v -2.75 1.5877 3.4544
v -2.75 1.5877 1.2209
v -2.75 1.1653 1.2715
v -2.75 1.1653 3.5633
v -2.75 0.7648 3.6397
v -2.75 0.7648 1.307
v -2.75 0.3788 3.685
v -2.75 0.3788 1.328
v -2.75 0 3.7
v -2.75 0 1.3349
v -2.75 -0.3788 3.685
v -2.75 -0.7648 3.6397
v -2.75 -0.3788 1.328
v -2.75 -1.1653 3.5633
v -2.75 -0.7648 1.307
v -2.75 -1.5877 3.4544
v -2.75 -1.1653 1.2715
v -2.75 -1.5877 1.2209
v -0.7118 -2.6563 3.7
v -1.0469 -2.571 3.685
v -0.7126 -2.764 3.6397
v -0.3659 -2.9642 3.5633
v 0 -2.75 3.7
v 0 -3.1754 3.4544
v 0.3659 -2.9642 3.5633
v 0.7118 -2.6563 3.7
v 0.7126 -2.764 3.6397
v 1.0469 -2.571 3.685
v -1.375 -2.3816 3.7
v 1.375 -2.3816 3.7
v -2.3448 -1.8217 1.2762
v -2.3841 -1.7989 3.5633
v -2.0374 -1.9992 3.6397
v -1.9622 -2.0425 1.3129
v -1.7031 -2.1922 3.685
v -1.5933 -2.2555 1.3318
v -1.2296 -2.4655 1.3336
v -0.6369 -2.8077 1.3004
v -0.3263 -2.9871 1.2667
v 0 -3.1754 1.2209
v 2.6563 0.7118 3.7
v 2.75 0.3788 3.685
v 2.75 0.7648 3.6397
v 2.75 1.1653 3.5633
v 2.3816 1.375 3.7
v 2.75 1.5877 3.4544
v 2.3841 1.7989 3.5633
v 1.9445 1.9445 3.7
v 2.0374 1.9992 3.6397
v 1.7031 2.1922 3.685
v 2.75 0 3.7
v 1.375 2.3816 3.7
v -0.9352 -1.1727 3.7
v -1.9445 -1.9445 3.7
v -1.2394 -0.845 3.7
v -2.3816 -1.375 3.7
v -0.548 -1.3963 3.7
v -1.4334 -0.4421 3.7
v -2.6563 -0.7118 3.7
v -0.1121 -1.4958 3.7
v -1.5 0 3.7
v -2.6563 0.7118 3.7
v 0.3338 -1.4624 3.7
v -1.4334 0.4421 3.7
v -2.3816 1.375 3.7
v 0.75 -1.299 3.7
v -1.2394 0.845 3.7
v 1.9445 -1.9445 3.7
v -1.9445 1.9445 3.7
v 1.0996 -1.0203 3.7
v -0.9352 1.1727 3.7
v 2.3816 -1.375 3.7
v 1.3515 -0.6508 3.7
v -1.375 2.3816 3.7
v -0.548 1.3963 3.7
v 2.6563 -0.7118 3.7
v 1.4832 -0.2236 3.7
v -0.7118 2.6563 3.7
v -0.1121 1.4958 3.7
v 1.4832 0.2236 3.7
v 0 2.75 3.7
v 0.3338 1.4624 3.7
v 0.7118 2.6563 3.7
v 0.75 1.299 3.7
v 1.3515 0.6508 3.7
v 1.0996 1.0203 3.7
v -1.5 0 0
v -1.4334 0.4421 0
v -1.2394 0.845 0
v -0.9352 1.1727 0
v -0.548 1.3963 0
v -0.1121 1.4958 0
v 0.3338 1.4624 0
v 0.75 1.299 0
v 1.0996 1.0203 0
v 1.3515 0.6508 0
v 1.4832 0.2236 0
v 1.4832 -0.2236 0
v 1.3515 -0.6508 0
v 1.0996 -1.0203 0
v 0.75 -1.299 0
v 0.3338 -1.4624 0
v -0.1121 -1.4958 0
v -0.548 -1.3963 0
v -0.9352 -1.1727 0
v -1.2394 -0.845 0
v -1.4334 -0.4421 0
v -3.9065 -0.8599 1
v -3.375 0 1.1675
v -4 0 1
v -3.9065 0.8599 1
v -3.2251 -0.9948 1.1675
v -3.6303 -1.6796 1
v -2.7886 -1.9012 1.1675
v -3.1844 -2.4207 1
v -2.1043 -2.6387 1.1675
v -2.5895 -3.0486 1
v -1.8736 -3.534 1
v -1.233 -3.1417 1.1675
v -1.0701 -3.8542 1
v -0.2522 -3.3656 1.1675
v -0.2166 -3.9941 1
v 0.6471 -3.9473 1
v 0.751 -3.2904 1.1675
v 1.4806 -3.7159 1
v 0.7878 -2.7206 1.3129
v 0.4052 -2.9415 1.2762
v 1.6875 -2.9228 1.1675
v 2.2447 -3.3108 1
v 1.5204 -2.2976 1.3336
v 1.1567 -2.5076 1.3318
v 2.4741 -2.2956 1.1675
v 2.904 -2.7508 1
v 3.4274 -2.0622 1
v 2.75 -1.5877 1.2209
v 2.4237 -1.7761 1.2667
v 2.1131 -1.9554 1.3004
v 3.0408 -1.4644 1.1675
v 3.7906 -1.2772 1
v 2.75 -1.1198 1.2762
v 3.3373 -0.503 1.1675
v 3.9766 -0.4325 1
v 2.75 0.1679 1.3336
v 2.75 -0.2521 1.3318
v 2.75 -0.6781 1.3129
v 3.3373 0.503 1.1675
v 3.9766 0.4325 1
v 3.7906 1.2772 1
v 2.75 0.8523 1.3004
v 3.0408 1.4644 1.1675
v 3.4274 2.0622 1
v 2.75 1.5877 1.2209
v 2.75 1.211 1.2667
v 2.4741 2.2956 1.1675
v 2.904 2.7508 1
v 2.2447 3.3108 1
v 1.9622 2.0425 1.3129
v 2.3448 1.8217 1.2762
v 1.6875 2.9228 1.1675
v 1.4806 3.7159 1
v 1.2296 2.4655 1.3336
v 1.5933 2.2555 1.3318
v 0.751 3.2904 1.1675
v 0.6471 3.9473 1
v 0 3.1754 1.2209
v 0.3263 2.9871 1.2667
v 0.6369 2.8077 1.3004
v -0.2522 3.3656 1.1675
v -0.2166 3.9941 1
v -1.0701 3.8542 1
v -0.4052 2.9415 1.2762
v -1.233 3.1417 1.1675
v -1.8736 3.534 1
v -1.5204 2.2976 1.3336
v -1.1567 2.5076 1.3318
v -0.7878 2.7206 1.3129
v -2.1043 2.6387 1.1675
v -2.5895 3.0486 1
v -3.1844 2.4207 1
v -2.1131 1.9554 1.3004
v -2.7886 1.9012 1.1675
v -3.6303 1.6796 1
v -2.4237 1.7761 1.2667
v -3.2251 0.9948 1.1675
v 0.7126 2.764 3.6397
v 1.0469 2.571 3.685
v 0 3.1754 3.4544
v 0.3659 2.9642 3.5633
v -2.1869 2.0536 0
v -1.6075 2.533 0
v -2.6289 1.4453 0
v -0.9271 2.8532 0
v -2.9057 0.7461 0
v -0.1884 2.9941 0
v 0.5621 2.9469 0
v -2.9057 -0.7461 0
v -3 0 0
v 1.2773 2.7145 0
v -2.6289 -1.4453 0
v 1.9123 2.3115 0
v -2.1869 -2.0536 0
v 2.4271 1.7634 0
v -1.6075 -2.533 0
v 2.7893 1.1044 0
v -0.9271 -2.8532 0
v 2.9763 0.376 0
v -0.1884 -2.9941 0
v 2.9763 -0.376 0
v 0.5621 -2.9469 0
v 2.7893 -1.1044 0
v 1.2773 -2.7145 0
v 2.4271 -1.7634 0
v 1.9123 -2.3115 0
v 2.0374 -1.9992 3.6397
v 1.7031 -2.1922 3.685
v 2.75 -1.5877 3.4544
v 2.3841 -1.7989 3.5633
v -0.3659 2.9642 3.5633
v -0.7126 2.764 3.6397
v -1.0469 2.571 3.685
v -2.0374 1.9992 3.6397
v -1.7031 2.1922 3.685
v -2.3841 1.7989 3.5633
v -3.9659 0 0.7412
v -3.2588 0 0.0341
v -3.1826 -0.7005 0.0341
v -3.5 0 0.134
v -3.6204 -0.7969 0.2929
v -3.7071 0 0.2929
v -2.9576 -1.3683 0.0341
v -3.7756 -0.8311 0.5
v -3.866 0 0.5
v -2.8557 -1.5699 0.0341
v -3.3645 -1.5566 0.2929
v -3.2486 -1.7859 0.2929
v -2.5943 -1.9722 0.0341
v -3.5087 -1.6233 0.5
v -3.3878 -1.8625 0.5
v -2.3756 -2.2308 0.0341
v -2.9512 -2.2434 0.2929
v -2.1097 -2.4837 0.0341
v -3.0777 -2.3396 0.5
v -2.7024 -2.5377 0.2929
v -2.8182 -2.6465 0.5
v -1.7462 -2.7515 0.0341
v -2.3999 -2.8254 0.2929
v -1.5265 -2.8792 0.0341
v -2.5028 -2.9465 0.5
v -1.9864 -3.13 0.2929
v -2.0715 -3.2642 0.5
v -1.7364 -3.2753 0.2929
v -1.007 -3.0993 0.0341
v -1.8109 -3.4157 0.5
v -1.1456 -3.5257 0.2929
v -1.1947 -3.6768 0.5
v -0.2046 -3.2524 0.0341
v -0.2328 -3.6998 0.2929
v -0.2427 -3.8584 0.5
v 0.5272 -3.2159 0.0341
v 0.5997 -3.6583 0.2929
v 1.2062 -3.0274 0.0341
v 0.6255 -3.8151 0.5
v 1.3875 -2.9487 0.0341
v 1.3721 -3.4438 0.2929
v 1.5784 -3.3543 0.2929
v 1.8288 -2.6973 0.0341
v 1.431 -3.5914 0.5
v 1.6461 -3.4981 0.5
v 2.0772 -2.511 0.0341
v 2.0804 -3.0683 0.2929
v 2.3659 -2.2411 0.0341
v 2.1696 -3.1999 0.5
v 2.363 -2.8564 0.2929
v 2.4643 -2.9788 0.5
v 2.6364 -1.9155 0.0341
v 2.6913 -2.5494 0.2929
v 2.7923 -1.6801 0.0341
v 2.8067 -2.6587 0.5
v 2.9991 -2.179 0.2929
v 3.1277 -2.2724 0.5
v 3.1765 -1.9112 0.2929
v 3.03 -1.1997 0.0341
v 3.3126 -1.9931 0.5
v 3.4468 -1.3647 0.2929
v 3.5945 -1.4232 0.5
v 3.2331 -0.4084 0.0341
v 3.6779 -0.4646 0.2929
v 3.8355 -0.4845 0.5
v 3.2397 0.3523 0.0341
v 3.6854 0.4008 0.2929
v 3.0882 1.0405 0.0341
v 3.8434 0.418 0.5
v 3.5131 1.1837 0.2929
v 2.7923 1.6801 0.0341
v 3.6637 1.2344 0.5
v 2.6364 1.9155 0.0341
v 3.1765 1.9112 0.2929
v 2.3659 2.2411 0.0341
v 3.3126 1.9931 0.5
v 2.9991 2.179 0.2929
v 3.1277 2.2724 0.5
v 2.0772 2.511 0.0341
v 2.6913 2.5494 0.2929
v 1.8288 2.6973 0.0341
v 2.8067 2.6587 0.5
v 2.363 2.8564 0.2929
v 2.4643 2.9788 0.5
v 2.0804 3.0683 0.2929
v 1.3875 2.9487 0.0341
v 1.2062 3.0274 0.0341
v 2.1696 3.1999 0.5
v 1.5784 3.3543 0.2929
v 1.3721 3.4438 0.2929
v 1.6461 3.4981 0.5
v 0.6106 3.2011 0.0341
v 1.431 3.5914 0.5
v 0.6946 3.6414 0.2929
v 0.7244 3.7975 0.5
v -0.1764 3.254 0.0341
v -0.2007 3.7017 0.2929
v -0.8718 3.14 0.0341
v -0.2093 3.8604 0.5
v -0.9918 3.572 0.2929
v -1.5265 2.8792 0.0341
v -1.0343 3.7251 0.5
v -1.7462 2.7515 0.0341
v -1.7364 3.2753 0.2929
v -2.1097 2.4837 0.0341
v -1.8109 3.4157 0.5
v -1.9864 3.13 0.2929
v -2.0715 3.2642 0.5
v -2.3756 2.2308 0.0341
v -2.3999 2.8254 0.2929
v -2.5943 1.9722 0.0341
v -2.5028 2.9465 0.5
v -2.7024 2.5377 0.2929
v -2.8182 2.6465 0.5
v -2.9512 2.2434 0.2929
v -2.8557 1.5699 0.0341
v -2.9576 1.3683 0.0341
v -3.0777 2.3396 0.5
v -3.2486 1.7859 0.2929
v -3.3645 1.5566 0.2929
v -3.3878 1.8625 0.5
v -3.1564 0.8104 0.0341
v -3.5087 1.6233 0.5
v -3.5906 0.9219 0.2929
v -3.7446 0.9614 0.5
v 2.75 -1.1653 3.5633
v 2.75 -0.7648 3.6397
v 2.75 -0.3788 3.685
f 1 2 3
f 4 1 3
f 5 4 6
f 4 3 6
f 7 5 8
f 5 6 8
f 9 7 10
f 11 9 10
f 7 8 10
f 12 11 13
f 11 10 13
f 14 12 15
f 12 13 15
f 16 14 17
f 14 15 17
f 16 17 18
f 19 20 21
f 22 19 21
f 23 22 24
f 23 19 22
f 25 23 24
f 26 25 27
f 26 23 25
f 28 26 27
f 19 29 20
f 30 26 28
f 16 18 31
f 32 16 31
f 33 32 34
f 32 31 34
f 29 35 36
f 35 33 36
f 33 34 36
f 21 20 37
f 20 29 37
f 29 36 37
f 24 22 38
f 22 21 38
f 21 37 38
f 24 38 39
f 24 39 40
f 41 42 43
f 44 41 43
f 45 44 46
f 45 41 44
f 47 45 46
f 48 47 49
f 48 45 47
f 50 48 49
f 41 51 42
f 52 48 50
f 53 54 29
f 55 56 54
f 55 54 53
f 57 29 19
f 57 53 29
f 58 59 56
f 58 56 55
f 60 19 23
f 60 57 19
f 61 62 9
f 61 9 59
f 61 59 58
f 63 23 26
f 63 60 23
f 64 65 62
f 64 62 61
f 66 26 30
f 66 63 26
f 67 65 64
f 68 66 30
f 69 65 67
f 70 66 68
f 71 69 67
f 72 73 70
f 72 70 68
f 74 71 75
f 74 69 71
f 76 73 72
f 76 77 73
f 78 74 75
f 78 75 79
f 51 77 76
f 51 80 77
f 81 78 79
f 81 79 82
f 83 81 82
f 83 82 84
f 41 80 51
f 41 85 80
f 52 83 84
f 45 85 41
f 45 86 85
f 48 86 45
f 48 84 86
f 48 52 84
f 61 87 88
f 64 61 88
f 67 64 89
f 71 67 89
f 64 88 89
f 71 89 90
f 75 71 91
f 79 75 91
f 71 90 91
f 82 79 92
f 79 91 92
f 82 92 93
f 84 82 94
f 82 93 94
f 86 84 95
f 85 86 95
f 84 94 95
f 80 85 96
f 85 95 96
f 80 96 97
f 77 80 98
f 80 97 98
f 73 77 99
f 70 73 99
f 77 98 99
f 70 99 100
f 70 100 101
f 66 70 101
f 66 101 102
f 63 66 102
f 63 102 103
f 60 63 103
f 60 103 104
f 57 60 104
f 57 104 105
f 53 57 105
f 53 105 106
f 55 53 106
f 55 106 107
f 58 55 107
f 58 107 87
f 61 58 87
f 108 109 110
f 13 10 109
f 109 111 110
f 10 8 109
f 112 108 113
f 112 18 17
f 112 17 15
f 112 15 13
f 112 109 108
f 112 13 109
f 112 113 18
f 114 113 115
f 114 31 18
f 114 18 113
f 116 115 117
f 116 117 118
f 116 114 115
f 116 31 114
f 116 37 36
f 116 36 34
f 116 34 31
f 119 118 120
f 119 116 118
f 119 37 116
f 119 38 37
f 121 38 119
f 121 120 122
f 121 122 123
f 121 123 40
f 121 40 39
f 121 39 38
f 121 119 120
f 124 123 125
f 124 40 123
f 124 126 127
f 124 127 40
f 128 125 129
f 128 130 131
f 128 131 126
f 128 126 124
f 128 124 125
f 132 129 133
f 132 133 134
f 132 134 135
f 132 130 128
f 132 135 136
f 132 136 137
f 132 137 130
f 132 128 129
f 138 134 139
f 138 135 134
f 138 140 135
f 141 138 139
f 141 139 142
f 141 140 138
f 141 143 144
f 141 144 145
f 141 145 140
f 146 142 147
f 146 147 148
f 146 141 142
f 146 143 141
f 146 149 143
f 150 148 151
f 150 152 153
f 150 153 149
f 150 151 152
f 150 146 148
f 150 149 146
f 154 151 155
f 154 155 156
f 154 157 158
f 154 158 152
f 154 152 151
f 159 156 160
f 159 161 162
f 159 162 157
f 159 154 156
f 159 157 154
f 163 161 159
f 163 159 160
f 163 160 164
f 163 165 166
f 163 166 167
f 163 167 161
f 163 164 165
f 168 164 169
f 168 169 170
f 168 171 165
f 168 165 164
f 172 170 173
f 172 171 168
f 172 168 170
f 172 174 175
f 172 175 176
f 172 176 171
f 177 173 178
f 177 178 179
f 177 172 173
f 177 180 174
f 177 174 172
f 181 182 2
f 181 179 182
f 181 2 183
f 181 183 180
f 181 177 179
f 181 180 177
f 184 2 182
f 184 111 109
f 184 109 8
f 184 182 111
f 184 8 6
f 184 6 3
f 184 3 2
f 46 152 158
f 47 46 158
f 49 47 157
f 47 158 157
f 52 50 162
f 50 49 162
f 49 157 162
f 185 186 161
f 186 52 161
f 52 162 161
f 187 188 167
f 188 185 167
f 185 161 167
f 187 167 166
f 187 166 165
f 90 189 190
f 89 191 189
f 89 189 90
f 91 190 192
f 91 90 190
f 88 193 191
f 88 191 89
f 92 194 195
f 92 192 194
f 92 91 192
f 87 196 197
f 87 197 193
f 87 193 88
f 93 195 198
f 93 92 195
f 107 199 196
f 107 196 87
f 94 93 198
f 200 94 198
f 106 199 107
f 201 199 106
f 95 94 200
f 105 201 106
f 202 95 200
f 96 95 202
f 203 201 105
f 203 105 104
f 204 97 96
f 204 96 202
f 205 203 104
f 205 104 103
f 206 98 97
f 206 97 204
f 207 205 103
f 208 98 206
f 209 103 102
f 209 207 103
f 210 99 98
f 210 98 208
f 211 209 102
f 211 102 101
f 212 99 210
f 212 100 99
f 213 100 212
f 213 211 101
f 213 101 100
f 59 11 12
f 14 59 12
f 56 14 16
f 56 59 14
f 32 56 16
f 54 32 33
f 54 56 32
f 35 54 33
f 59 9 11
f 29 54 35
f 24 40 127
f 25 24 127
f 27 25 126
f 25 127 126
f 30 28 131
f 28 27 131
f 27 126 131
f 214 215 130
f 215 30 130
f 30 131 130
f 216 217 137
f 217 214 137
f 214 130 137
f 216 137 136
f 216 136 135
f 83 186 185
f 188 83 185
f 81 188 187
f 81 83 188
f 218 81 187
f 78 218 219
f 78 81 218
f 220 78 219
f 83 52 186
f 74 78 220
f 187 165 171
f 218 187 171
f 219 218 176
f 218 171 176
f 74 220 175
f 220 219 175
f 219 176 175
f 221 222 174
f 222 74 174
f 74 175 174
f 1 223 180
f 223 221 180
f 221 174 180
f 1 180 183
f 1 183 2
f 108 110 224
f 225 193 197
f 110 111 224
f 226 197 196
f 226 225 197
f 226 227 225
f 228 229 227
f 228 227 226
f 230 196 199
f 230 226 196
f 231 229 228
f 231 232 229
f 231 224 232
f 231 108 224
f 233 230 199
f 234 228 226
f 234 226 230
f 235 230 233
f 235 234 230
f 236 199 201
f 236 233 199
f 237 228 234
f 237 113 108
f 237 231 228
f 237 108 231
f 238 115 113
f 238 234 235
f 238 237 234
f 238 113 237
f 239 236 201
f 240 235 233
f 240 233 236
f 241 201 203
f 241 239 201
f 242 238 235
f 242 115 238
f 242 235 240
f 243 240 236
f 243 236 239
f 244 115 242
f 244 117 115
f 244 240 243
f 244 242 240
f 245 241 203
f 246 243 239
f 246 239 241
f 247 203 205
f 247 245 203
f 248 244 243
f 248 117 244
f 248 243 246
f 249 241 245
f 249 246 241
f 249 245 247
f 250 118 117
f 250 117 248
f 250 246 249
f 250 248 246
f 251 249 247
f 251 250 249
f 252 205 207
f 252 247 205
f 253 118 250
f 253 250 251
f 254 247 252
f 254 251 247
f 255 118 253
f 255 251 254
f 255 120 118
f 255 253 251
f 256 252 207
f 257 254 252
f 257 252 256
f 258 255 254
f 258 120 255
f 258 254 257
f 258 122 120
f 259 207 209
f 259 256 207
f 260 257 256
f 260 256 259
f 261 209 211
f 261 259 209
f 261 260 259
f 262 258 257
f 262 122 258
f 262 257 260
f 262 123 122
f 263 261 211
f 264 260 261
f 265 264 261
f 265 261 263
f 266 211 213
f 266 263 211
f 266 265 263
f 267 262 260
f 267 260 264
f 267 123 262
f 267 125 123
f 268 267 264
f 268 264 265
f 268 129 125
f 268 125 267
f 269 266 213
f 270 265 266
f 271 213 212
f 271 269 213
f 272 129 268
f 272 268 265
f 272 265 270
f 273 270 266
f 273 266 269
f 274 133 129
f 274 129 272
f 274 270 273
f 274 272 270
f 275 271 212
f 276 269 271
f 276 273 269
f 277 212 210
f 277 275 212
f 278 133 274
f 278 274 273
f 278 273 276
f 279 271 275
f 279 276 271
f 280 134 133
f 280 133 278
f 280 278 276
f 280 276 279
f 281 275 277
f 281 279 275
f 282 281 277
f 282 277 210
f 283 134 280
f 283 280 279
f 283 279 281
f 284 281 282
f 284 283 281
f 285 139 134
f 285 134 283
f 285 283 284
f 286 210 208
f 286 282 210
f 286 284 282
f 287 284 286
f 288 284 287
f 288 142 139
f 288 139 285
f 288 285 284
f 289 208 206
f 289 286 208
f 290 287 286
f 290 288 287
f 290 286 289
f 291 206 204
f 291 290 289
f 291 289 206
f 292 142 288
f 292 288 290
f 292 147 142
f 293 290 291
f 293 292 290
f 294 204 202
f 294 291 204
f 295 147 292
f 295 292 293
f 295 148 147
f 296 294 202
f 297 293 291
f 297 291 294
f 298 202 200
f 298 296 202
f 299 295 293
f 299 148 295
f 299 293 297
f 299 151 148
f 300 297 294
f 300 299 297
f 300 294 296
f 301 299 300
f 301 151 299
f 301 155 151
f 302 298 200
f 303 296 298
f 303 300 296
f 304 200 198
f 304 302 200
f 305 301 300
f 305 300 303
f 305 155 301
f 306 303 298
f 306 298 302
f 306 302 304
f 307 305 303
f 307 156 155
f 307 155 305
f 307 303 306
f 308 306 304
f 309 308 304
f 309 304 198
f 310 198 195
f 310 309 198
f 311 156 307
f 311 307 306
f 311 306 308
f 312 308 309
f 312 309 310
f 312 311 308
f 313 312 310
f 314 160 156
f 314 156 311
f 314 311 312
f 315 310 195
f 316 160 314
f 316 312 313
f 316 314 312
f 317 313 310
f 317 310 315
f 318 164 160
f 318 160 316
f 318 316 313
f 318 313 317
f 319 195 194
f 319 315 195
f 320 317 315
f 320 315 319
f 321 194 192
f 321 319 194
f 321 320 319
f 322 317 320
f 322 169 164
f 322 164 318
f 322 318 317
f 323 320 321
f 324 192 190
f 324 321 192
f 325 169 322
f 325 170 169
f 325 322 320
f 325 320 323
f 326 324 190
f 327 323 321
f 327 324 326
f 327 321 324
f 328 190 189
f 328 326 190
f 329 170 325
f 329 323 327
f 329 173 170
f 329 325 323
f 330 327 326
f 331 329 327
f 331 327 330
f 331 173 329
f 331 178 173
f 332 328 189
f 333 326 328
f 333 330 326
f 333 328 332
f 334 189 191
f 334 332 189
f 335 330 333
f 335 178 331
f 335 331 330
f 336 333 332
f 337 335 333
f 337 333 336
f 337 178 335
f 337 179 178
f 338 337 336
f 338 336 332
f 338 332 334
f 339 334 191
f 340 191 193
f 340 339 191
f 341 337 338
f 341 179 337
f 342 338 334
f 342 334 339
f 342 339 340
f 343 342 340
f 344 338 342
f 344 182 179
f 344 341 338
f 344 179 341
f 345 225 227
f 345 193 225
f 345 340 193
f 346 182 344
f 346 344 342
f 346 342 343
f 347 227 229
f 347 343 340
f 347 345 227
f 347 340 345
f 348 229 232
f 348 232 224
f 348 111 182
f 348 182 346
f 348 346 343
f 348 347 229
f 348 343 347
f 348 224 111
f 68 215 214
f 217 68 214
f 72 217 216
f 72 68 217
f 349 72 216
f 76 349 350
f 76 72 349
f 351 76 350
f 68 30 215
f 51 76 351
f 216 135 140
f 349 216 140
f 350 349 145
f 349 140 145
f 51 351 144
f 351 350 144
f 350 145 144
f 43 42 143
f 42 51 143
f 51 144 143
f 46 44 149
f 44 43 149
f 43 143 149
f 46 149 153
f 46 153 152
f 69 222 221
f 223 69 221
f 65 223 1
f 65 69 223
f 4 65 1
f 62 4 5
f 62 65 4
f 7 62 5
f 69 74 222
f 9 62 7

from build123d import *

# Parameters (mm, degrees)
EXTRUDE1_DEPTH     = 2.7
SKETCH4_R          = 1.5
CUT_EXTRUDE1_DEPTH = 7.759437846


with BuildPart() as part:
    # Sketch1 → Extrude1 (new body)
    with BuildSketch(Plane.XY.offset(1)):
        Polygon((0, 3.175426481), (-2.75, 1.58771324), (-2.75, -1.58771324), (0, -3.175426481), (2.75, -1.58771324), (2.75, 1.58771324), align=None)
    extrude(amount=EXTRUDE1_DEPTH)

    # Sketch2 → Revolve1 (revolve)
    with BuildSketch(Plane(origin=(0, 0, 0), x_dir=(0, 0, -1), z_dir=(1, 0, 0)), mode=Mode.PRIVATE) as revolve1_sk:
        with BuildLine():
            Line((0, 0), (0, 3))
            ThreePointArc((0, 3), (-0.292893219, 3.707106781), (-1, 4))
            Line((-1, 4), (-2.07179677, 0))
            Line((-2.07179677, 0), (0, 0))
        make_face()
    revolve(revolve1_sk.sketch.rotate(Axis((0, 0, 0), (0, 0, 1)), 90), axis=Axis((0, 0, 0), (0, 0, 1)))

    # Sketch3 → Cut-Revolve1 (revolve, cut)
    with BuildSketch(Plane(origin=(0, 0, 0), x_dir=(1, 0, 0), z_dir=(0, 1, 0))):
        Polygon((-2.75, -3.7), (-3.85, -3.7), (-3.85, -3.064914704), align=None)
    revolve(axis=Axis((0, 0, 0), (0, 0, 1)), mode=Mode.SUBTRACT)

    # Sketch4 → Cut-Extrude1 (cut, through all)
    with BuildSketch(Plane(origin=(0, 0, 0), x_dir=(-1, 0, 0), z_dir=(0, 0, -1))):
        Circle(SKETCH4_R)
    extrude(amount=-CUT_EXTRUDE1_DEPTH, mode=Mode.SUBTRACT)


solid = part.part
